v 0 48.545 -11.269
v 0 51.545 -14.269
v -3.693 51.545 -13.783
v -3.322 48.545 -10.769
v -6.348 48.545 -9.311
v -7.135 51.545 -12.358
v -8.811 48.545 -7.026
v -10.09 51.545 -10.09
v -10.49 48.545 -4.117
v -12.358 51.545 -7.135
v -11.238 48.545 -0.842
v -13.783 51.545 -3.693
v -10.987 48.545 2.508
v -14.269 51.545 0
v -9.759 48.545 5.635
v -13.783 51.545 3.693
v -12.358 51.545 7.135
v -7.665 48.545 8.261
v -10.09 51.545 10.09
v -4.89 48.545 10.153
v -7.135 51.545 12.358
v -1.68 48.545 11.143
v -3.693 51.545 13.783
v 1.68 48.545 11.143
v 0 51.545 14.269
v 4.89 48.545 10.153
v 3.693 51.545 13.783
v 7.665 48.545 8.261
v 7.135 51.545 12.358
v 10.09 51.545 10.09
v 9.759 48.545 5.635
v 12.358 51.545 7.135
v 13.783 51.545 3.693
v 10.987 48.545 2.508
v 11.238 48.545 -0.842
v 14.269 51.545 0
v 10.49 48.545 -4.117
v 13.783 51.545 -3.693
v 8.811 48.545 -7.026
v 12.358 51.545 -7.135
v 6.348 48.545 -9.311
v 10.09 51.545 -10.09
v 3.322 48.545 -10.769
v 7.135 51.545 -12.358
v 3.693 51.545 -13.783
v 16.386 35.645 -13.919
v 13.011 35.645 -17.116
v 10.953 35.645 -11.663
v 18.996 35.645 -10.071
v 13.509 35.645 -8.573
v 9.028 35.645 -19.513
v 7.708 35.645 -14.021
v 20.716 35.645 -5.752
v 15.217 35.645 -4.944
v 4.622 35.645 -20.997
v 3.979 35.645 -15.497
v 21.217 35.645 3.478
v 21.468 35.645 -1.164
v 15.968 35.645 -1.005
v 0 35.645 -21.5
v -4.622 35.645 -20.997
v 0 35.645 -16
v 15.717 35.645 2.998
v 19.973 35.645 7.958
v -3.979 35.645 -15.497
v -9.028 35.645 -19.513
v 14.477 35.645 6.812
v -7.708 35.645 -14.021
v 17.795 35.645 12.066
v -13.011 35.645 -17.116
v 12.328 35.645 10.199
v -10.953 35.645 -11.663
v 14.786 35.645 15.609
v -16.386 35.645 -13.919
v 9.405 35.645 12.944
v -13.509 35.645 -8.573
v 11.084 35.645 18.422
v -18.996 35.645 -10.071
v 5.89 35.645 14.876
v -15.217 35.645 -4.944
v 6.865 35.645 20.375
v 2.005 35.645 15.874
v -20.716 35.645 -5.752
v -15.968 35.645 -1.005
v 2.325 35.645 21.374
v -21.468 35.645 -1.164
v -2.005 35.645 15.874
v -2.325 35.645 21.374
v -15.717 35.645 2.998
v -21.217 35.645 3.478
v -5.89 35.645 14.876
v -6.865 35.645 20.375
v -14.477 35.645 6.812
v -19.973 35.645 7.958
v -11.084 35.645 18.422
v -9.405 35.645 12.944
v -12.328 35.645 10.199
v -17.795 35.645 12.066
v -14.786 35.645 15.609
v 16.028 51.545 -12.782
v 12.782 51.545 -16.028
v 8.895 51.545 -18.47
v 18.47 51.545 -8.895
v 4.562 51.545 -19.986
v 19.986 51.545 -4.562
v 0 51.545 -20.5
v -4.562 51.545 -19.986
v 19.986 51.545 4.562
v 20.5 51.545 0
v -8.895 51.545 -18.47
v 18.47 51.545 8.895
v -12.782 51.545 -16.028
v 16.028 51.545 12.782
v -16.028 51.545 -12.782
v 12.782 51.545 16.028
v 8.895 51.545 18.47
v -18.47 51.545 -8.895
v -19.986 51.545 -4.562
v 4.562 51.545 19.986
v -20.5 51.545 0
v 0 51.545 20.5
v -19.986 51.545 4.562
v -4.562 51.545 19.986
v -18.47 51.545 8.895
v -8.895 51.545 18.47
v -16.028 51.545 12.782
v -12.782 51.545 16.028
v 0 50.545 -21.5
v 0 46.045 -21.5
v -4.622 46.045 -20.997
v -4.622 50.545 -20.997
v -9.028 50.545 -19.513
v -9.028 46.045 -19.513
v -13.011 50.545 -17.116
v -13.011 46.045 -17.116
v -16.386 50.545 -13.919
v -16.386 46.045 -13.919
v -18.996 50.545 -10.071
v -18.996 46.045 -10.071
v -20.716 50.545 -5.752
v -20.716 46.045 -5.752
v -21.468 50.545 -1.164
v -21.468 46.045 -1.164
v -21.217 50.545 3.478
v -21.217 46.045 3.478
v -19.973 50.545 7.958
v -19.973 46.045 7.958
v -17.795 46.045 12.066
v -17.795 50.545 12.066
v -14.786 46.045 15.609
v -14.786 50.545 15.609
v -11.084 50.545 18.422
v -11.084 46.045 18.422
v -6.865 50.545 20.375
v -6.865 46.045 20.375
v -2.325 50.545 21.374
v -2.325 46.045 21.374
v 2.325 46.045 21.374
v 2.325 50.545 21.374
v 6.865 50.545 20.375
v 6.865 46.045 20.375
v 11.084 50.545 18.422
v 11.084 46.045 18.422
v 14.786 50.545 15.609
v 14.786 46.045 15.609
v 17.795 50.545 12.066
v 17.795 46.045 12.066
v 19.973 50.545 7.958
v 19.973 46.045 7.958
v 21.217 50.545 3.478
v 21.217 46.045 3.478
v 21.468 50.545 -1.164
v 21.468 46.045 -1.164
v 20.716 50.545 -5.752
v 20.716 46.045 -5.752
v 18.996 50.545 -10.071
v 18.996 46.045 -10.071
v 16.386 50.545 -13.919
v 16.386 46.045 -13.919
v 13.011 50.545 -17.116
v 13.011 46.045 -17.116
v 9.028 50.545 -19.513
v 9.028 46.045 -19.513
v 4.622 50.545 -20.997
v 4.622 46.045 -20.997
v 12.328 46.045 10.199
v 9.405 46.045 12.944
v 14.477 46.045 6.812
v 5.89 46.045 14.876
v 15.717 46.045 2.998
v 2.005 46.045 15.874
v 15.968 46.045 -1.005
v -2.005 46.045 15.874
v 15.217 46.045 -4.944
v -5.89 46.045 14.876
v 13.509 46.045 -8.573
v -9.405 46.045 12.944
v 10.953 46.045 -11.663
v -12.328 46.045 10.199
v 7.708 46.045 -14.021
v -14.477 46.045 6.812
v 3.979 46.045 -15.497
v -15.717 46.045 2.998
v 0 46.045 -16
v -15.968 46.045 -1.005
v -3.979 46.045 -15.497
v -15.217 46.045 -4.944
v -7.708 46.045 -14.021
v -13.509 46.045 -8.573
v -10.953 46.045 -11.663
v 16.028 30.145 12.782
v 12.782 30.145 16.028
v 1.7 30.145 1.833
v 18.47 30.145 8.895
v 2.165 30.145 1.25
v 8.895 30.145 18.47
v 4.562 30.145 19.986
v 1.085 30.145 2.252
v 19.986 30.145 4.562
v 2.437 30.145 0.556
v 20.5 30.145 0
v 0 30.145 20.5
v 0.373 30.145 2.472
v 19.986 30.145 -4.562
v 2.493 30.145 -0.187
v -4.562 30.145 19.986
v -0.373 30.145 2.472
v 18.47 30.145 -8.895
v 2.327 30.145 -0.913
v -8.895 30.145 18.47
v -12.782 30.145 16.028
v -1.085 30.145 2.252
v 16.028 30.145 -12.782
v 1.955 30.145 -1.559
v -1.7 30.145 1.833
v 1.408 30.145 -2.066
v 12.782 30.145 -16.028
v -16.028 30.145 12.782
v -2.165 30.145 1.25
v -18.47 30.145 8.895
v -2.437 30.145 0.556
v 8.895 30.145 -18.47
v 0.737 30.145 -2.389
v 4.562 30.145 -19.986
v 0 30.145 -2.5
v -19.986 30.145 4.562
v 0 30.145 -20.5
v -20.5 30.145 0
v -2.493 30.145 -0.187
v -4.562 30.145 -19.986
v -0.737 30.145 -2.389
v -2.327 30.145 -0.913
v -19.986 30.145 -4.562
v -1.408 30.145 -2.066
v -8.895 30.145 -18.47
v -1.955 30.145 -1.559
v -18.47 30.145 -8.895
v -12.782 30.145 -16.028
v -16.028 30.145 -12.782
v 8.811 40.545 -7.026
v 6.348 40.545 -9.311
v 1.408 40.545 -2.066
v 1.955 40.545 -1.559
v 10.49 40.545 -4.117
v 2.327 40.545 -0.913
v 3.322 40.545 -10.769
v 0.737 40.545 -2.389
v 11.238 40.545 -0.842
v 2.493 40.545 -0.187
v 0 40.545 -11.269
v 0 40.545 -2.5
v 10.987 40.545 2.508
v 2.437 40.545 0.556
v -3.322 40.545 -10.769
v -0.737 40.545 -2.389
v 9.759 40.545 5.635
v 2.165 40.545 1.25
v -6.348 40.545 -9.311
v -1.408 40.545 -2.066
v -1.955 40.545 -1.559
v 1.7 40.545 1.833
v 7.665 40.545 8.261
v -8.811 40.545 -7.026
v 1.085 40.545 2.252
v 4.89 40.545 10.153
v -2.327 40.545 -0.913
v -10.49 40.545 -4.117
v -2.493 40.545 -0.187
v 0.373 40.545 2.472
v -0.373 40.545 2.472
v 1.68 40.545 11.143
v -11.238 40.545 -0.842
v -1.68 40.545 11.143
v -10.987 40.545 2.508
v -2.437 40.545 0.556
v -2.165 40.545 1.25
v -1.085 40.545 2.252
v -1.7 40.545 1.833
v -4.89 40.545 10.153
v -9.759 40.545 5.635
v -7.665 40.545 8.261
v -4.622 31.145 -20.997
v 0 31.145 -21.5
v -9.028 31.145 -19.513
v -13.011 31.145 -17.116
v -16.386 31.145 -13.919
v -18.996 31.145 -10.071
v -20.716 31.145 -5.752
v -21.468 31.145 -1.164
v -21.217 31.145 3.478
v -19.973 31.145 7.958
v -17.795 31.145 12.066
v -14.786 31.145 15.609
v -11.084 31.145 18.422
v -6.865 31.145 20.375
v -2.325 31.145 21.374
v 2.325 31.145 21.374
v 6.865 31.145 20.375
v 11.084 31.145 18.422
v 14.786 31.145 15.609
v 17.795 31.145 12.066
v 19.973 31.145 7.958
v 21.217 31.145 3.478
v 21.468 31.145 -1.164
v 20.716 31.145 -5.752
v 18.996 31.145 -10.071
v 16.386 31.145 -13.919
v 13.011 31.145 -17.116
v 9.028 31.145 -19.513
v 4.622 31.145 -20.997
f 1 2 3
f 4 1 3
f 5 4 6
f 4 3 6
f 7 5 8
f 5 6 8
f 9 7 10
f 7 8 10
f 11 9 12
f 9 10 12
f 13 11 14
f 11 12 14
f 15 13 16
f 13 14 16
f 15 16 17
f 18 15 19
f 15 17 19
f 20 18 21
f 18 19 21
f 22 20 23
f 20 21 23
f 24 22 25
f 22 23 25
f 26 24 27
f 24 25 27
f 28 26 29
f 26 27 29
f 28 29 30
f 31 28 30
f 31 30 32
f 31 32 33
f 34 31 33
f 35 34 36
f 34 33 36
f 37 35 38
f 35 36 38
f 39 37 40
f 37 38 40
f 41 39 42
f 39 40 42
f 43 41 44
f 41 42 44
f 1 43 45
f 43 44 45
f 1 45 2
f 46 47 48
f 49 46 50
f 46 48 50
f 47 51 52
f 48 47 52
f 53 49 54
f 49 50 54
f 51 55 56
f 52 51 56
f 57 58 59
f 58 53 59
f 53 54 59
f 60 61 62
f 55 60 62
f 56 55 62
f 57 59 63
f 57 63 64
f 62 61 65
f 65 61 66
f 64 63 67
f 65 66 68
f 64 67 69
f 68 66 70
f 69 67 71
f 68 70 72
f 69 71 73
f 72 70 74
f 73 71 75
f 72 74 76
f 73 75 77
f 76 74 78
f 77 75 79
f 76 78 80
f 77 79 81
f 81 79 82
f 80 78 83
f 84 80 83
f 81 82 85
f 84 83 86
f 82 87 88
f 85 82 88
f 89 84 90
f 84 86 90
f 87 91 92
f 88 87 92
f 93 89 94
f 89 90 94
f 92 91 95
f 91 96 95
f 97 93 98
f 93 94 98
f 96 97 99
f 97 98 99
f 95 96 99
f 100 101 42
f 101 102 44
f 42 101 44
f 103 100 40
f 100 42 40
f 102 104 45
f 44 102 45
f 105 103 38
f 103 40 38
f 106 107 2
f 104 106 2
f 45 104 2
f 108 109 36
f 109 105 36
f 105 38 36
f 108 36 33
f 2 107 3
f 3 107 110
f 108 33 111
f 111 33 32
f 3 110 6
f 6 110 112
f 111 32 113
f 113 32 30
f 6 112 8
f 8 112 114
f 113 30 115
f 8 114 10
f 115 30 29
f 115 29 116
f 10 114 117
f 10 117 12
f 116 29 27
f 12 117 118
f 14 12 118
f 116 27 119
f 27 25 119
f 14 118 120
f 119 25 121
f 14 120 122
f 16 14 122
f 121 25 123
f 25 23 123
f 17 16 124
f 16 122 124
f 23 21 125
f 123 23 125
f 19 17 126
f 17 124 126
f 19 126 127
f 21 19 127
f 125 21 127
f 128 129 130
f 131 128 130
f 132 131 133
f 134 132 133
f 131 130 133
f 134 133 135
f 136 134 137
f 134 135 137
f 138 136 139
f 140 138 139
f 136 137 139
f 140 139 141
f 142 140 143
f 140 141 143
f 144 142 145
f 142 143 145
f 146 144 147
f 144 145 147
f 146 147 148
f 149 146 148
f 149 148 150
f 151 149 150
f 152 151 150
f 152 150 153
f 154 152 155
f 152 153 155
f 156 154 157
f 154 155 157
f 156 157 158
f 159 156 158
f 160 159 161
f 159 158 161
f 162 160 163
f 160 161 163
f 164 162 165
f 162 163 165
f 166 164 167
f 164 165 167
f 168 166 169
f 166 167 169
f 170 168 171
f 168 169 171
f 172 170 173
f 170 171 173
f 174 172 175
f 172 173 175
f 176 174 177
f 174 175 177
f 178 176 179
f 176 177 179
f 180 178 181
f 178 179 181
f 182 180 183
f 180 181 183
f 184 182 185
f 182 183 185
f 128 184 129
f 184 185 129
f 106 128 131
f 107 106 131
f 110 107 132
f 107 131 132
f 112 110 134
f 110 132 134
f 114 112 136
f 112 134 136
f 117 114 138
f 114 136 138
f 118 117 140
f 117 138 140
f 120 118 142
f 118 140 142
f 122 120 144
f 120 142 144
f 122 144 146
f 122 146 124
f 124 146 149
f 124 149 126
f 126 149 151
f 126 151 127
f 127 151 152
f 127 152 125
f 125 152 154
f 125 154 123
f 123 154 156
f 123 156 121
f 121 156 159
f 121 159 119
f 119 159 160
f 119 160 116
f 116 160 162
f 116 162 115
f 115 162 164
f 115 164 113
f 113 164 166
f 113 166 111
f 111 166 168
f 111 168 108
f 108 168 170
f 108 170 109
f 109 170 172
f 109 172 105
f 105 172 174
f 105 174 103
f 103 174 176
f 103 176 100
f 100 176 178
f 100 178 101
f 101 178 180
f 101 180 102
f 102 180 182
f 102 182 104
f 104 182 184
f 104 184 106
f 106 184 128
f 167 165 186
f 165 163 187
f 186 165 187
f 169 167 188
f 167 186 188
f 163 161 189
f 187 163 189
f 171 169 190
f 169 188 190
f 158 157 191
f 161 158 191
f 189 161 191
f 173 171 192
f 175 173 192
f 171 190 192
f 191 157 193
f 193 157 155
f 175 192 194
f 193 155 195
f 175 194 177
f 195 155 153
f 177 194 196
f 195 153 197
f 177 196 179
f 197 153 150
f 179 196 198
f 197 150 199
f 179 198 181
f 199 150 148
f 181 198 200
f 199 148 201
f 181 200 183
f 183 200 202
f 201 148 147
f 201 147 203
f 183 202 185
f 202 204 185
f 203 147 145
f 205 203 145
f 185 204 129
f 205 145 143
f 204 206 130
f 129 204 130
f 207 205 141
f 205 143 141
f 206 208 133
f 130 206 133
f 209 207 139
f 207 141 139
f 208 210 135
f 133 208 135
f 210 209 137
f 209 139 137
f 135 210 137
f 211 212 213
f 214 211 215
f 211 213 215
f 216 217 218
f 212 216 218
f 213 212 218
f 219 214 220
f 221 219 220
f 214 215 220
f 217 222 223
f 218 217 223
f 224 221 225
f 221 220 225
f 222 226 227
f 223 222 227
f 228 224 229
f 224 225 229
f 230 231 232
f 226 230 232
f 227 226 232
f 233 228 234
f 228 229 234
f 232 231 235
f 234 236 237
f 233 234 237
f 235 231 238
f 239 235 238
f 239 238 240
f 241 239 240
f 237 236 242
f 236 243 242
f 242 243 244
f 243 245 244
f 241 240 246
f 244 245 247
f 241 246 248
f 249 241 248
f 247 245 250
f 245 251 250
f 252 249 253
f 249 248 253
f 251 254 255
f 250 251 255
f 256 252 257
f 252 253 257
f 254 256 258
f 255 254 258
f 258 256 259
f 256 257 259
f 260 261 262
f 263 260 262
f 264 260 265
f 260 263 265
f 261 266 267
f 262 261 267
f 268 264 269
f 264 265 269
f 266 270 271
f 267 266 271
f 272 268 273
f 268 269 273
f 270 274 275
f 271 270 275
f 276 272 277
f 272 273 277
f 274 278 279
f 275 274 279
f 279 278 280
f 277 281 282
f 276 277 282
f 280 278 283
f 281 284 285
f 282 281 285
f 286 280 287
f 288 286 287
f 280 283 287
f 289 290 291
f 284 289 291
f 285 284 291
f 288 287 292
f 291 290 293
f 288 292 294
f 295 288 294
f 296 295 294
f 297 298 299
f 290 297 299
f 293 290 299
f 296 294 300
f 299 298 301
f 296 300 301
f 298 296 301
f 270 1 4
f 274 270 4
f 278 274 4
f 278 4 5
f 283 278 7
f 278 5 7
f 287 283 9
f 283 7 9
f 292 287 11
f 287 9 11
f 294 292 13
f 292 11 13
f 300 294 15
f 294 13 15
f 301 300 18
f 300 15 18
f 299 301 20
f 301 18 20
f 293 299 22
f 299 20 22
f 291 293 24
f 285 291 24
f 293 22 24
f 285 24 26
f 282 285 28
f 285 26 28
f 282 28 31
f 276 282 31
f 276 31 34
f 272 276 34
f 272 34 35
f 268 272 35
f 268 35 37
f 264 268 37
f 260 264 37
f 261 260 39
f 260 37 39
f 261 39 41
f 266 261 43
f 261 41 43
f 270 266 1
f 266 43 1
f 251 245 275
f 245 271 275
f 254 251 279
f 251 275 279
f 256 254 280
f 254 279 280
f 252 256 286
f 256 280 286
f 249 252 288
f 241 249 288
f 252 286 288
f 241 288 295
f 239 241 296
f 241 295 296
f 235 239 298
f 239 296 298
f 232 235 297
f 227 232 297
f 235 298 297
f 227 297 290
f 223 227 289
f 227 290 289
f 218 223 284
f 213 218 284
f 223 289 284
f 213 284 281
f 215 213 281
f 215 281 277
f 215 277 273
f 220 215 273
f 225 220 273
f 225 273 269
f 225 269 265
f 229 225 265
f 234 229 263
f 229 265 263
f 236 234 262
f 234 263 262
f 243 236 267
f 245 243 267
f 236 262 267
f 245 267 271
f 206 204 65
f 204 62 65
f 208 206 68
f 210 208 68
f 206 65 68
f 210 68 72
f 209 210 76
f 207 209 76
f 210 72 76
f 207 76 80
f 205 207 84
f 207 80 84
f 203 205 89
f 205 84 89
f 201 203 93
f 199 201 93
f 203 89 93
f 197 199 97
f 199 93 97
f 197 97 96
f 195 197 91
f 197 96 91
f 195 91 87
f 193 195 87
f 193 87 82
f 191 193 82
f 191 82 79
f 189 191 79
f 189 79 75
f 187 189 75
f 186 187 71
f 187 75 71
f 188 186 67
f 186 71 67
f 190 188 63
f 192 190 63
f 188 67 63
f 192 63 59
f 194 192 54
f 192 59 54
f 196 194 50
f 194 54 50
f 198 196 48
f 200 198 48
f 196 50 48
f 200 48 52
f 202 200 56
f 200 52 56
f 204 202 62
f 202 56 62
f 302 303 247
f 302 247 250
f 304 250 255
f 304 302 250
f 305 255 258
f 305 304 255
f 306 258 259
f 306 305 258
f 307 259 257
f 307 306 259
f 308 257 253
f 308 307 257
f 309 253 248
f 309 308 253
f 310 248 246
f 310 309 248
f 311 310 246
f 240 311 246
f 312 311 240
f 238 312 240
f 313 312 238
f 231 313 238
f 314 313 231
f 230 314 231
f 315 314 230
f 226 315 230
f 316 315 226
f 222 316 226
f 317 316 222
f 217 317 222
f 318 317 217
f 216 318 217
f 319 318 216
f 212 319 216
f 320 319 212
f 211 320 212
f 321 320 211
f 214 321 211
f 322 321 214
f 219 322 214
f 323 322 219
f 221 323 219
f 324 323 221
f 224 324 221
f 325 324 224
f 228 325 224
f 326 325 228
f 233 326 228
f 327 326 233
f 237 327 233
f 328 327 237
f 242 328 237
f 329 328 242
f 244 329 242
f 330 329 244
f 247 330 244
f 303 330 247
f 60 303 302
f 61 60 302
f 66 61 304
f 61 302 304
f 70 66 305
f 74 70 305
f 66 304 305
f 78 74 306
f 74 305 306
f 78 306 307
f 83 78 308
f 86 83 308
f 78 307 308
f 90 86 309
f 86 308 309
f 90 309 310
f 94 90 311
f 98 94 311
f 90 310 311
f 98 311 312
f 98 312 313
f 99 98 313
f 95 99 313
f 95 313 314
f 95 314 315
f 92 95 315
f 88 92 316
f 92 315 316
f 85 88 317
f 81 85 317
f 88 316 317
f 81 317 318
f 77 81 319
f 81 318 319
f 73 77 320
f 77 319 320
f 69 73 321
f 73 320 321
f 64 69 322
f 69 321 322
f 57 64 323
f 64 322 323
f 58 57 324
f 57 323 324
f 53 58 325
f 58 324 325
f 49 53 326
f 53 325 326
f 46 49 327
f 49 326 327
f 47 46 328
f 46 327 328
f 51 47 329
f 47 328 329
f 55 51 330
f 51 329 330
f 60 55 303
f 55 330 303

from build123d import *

# Parameters (mm, degrees)
CHAMFER1_SIZE = 3
CHAMFER2_SIZE = 1


with BuildPart() as part:
    # Sketch1 → Revolve1 (revolve)
    with BuildSketch(Plane.XY, mode=Mode.PRIVATE) as revolve1_sk:
        Polygon((2.5, 40.545486338), (11.269263071, 40.545486338), (11.269263071, 51.545486338), (21.5, 51.545486338), (21.5, 46.045486338), (16, 46.045486338), (16, 35.645486338), (21.5, 35.645486338), (21.5, 30.145486338), (2.5, 30.145486338), align=None)
    revolve(revolve1_sk.sketch.rotate(Axis((0, 0, 0), (0, 1, 0)), 90), axis=Axis((0, 0, 0), (0, 1, 0)))

    # Chamfer1
    chamfer1_edges = [part.edges().sort_by_distance(p)[0] for p in [
        (0, 51.545486338, 11.269263071),
    ]]
    chamfer(chamfer1_edges, length=CHAMFER1_SIZE)

    # Chamfer2
    chamfer2_edges = [part.edges().sort_by_distance(p)[0] for p in [
        (0, 30.145486338, 21.5),
        (0, 51.545486338, 21.5),
    ]]
    chamfer(chamfer2_edges, length=CHAMFER2_SIZE)


solid = part.part
